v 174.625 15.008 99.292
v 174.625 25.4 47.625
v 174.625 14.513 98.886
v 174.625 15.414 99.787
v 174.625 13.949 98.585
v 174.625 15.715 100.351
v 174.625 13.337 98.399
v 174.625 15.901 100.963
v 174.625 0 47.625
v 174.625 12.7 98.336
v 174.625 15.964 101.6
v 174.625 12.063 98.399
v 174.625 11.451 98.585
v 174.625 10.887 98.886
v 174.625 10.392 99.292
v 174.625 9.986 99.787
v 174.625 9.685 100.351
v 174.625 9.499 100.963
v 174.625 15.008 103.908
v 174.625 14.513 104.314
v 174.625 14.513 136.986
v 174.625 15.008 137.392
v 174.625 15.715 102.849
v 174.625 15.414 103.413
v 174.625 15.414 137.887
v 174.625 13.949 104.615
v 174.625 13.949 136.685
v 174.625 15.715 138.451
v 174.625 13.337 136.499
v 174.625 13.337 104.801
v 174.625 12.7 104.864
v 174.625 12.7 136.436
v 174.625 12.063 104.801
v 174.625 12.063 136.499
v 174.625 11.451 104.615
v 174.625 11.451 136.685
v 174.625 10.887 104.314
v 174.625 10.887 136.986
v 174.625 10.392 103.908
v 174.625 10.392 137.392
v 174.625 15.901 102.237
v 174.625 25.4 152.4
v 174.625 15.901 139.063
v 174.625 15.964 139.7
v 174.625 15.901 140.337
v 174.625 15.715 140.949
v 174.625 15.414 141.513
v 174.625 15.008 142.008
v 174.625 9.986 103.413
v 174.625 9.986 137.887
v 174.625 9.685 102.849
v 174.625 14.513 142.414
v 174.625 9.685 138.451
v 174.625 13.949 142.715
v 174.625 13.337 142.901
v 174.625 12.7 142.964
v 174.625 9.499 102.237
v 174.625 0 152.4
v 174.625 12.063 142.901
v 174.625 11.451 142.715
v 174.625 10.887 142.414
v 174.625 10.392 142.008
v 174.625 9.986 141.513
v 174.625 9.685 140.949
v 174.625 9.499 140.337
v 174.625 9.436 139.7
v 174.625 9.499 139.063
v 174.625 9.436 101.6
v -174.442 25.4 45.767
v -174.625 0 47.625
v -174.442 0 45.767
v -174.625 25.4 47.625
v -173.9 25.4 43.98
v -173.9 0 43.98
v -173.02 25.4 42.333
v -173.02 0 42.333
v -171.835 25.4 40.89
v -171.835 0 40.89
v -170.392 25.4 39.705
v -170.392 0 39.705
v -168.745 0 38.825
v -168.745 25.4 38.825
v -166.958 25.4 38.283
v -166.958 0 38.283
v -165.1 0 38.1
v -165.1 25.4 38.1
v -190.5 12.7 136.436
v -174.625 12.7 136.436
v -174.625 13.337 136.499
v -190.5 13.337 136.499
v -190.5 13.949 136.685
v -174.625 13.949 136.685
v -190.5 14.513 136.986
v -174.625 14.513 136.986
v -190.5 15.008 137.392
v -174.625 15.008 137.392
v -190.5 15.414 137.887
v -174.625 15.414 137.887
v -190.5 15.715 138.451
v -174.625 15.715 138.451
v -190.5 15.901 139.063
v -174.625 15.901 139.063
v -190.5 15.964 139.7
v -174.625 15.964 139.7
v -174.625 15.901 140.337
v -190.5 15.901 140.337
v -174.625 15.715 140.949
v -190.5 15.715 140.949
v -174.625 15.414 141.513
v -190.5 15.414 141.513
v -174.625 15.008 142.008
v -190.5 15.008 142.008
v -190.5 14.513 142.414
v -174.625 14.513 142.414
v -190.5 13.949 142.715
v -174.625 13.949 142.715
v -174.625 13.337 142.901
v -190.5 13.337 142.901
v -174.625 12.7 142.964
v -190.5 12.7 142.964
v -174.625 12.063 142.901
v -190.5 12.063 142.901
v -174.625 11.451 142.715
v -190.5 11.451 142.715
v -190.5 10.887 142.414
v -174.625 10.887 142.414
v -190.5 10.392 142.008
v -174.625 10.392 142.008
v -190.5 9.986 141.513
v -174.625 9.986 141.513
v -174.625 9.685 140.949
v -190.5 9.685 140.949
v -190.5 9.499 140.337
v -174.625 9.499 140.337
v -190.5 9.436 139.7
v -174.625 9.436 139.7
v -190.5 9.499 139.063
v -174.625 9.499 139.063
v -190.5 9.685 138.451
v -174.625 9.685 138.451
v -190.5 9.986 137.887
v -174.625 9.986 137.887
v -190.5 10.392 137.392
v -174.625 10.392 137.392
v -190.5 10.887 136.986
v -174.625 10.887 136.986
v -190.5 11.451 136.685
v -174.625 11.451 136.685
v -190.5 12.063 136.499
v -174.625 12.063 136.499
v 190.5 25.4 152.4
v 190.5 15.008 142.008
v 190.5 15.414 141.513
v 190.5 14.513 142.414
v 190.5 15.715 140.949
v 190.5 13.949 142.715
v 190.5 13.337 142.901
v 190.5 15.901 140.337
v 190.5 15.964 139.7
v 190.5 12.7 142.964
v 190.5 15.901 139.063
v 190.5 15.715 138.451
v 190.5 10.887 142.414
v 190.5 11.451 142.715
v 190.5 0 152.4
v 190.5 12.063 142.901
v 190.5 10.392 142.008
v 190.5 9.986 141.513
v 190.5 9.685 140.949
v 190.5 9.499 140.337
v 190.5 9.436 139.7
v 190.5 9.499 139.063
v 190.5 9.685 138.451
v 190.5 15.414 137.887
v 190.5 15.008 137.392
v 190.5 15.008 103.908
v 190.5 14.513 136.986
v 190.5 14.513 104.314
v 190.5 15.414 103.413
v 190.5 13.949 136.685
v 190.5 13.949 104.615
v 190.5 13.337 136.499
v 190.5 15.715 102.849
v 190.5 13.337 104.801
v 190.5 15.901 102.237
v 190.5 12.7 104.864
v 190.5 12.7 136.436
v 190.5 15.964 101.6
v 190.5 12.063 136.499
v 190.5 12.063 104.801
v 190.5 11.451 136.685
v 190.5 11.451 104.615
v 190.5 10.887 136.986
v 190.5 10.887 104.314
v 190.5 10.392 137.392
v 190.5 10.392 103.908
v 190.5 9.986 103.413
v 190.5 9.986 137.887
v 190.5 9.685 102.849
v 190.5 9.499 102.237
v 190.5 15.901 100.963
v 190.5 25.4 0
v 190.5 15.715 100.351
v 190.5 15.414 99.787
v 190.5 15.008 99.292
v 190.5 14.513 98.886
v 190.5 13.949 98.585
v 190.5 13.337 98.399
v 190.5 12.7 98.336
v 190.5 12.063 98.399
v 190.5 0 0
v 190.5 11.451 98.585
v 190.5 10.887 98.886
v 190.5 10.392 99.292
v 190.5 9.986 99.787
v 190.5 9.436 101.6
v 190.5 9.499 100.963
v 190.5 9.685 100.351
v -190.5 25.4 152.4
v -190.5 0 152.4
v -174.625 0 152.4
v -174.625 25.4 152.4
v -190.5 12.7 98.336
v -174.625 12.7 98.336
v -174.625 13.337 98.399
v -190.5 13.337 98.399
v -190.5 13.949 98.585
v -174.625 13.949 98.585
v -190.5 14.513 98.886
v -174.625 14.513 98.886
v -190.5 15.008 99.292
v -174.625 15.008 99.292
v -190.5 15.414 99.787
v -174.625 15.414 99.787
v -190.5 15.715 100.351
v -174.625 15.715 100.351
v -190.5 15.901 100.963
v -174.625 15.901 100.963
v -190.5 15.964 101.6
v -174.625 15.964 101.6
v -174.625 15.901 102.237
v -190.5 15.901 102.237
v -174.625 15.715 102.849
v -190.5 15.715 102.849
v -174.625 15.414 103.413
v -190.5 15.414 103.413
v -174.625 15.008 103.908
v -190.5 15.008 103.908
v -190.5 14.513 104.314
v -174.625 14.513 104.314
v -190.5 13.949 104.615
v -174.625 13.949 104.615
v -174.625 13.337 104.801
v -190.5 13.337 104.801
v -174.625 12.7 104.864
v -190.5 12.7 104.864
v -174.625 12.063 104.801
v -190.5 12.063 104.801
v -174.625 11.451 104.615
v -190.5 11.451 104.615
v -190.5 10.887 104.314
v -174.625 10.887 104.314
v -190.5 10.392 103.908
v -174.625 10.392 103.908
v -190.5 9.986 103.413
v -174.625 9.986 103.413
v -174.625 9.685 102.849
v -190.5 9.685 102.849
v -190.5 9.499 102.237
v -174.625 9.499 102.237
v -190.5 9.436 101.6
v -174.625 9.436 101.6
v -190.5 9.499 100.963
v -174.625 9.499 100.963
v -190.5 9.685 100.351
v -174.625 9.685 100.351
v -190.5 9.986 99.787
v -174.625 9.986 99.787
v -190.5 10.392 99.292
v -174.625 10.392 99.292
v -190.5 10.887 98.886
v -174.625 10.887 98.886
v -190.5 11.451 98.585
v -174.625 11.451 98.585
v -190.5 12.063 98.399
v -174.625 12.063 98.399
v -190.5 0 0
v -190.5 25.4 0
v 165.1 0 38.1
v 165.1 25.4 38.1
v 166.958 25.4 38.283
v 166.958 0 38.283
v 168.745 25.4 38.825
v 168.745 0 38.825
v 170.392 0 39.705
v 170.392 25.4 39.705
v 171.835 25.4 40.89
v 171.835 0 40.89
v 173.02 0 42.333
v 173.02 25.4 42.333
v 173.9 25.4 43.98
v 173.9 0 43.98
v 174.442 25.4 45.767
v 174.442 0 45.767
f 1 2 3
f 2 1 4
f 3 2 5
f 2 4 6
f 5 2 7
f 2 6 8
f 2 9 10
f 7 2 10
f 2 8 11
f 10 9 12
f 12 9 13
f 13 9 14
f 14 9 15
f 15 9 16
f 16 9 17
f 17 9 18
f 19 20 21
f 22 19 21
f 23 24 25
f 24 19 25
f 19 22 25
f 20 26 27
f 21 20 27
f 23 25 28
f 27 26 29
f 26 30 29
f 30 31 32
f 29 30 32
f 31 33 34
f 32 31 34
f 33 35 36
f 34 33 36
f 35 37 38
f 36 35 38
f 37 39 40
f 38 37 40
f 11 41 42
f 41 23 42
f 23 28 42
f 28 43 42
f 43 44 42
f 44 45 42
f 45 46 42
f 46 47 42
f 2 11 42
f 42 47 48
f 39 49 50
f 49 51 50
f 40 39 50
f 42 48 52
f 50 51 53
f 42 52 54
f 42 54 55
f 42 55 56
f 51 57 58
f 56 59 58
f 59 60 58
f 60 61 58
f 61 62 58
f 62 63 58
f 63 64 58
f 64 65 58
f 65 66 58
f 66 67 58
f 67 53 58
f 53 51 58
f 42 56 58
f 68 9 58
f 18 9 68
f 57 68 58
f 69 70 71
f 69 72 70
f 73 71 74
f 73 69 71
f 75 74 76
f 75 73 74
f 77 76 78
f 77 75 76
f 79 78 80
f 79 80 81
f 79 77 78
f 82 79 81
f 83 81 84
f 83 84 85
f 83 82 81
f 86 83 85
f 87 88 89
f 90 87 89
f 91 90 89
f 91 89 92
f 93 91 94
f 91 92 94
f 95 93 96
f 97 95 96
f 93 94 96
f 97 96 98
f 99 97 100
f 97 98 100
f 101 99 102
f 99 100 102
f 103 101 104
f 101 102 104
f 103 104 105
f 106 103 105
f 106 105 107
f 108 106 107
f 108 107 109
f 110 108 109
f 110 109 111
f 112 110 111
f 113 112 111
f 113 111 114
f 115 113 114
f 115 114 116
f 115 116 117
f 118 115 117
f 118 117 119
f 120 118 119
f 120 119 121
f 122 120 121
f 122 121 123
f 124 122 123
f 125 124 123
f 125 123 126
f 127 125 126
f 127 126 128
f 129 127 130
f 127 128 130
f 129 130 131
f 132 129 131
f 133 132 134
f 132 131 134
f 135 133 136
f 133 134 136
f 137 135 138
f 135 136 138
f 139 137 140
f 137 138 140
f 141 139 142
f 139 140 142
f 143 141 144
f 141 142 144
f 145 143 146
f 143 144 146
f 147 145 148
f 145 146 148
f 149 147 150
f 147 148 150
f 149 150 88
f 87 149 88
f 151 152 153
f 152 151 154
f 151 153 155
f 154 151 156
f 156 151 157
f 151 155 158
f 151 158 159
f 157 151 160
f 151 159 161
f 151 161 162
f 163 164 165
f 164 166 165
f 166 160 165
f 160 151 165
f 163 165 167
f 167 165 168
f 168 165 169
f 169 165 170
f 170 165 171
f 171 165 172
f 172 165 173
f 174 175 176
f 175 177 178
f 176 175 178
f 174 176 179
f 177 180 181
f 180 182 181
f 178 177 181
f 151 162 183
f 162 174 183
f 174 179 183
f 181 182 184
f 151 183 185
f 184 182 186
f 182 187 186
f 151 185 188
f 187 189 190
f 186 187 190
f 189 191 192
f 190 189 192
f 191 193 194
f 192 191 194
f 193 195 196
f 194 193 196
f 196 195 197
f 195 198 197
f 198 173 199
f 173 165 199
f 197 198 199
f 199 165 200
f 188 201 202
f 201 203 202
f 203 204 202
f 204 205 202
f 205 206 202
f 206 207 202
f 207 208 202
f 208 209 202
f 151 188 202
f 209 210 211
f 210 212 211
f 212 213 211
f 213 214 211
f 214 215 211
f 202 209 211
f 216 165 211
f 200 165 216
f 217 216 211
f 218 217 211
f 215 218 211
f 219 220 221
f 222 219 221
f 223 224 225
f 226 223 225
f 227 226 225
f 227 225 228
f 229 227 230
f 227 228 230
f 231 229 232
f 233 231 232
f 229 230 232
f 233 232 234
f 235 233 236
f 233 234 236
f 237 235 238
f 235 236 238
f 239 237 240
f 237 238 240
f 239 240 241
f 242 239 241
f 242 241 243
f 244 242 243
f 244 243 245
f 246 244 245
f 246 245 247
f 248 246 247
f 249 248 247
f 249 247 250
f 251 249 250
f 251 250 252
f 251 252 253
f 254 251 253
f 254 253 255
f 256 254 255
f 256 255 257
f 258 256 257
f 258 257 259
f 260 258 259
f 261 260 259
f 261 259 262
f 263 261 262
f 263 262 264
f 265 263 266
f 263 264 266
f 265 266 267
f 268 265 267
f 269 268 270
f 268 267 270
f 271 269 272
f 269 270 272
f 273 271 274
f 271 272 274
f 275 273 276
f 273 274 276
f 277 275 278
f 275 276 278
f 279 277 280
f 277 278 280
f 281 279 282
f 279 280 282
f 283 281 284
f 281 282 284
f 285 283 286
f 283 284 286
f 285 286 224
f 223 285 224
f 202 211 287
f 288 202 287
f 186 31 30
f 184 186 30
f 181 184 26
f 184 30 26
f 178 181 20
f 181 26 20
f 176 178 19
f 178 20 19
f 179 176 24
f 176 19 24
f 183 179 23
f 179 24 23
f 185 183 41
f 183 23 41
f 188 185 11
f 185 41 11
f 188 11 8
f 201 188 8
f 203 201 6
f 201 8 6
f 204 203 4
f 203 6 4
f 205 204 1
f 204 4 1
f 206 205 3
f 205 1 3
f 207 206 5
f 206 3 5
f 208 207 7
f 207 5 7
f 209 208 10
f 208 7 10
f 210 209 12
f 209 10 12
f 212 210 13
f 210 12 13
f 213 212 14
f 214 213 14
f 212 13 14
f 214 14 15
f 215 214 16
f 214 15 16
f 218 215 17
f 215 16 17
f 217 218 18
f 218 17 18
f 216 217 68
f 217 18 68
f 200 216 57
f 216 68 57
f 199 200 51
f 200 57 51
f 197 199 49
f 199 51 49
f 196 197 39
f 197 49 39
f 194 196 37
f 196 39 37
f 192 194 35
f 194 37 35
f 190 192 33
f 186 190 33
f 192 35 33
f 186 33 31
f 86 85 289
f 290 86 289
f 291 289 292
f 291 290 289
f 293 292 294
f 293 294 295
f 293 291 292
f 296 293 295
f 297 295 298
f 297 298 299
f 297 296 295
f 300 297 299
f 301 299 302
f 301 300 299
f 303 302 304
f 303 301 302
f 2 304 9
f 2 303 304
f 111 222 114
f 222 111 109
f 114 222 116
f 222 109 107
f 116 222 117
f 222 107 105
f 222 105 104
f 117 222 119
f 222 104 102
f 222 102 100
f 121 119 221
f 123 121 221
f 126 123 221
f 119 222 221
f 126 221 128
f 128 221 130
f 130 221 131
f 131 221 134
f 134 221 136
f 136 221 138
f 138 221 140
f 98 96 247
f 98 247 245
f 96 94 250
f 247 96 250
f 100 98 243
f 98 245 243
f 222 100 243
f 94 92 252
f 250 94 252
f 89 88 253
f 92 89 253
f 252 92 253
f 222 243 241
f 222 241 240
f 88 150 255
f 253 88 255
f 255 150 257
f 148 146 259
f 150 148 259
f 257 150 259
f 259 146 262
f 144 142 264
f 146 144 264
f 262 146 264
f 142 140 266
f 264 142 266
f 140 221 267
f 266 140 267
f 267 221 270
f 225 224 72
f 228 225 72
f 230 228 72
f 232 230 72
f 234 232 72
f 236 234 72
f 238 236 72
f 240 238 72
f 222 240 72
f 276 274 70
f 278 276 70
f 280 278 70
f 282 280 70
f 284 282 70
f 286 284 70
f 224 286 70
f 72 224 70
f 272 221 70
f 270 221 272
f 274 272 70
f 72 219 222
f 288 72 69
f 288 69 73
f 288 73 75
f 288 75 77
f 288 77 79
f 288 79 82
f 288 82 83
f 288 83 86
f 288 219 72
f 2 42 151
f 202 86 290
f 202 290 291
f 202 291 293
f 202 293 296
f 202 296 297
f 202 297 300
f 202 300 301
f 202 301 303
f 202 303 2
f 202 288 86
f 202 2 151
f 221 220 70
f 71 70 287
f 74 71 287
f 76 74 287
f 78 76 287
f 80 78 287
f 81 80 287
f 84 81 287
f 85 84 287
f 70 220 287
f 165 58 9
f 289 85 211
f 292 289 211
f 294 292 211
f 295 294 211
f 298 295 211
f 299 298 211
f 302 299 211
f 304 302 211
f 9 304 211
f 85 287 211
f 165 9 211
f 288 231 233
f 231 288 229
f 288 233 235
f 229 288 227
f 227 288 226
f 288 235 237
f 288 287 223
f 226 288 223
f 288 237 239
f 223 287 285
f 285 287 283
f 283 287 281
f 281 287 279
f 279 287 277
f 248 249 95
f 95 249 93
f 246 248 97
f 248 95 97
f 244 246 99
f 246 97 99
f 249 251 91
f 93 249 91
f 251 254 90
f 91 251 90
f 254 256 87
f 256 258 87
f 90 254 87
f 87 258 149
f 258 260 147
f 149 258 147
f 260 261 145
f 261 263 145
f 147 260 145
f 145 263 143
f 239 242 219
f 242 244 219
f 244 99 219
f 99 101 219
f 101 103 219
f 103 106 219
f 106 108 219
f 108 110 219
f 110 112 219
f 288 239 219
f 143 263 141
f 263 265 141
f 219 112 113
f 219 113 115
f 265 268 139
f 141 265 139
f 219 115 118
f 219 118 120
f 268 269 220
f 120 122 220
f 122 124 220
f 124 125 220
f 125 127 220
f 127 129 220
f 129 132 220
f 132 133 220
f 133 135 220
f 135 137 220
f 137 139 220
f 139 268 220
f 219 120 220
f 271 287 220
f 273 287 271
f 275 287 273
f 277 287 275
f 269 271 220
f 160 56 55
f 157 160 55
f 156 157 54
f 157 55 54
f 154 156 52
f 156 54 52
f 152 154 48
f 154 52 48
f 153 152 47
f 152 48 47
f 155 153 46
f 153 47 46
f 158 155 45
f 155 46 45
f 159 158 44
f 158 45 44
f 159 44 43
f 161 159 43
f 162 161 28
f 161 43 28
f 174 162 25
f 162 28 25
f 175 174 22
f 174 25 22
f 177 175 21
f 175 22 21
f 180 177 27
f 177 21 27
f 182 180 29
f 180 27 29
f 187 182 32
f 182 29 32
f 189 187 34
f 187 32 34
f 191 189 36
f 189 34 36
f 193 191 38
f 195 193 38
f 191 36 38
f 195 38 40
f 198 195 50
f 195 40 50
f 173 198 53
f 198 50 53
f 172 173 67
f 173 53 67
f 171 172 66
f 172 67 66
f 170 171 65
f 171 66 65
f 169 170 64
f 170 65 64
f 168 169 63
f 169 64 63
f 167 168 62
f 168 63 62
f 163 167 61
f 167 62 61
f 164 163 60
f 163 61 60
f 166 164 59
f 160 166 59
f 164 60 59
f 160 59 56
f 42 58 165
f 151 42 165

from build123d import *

# Parameters (mm, degrees)
EXTRUDE1_DEPTH               = 25.4
FILLET1_R                    = 9.525
F_5_16_18_TAPPED_HOLE1_D     = 6.5278
F_5_16_18_TAPPED_HOLE1_DEPTH = 15.875
F_5_16_18_TAPPED_HOLE2_D     = 6.5278


with BuildPart() as part:
    # Sketch1 → Extrude1 (new body)
    with BuildSketch(Plane(origin=(0, 0, 0), x_dir=(1, 0, 0), z_dir=(0, 1, 0))):
        Polygon((174.625, -152.4), (190.5, -152.4), (190.5, 0), (-190.5, 0), (-190.5, -152.4), (-174.625, -152.4), (-174.625, -38.1), (174.625, -38.1), align=None)
    extrude(amount=EXTRUDE1_DEPTH)

    # Fillet1
    fillet1_edges = [part.edges().sort_by_distance(p)[0] for p in [
        (174.625, 12.7, 38.1),
        (-174.625, 12.7, 38.1),
    ]]
    fillet(fillet1_edges, radius=FILLET1_R)

    # 5/16-18 Tapped Hole1
    with Locations(Plane(origin=(190.5, 0, 0), x_dir=(0, 0, -1), z_dir=(1, 0, 0))):
        with Locations((-139.7, 12.7), (-101.6, 12.7)):
            Hole(F_5_16_18_TAPPED_HOLE1_D / 2, depth=F_5_16_18_TAPPED_HOLE1_DEPTH)

    # 5/16-18 Tapped Hole2 (through all)
    with Locations(Plane.ZY.offset(190.5)):
        with Locations((101.6, 12.7), (139.7, 12.7)):
            Hole(F_5_16_18_TAPPED_HOLE2_D / 2)


solid = part.part
